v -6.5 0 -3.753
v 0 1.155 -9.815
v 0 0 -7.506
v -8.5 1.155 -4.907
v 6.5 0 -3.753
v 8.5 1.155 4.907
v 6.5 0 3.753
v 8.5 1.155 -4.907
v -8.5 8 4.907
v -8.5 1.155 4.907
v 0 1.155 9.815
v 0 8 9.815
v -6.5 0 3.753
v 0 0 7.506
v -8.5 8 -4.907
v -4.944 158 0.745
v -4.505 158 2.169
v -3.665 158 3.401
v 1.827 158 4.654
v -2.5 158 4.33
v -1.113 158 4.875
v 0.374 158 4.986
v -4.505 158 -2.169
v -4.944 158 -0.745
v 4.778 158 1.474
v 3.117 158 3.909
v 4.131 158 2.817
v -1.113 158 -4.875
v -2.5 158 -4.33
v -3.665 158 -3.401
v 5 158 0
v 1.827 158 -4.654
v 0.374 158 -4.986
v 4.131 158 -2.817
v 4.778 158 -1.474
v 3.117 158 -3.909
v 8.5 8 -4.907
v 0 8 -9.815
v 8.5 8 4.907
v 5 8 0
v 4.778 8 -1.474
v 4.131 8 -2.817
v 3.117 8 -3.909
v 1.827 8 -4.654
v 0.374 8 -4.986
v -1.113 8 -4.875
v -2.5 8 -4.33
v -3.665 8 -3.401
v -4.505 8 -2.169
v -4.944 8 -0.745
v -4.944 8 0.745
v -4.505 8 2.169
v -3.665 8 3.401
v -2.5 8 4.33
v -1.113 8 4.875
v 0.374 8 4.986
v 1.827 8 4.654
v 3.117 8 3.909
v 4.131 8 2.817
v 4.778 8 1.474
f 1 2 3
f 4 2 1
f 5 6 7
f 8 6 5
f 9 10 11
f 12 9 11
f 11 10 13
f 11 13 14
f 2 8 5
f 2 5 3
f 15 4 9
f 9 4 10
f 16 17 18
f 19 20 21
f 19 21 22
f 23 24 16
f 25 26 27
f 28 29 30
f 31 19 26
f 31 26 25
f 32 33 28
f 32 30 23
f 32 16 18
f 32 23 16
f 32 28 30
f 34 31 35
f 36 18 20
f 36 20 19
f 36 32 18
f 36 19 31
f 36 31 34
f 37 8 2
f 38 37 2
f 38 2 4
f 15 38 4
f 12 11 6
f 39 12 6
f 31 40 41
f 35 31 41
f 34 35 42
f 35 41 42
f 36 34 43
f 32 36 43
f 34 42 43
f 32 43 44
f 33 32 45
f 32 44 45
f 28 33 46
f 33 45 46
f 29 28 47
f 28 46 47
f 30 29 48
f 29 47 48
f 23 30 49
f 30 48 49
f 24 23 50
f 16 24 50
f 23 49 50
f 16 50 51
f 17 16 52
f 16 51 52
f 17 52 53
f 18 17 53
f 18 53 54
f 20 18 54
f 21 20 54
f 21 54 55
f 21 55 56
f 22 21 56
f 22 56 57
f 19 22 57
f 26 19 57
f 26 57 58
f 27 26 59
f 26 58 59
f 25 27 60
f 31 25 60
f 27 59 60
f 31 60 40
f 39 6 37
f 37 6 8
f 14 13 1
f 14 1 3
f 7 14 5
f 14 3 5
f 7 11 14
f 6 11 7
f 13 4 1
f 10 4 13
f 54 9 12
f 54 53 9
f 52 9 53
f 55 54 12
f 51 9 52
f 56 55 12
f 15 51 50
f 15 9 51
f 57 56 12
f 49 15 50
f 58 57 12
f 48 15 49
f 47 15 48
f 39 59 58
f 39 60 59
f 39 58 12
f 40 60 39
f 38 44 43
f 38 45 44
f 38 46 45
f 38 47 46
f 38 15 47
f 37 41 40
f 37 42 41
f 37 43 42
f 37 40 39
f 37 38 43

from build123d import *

# Parameters (mm, degrees)
EXTRUDE_1_DEPTH = 8
SKETCH_2_R      = 5
EXTRUDE_2_DEPTH = 150
CHAMFER_1_SIZE  = 2
CHAMFER_1_SIZE2 = 1.154700538


with BuildPart() as part:
    # Эскиз1 → Бобышка-Вытянуть1 (new body)
    with BuildSketch(Plane(origin=(0, 0, 0), x_dir=(1, 0, 0), z_dir=(0, 1, 0))):
        Polygon((8.5, -4.907477288), (8.5, 4.907477288), (0, 9.814954576), (-8.5, 4.907477288), (-8.5, -4.907477288), (0, -9.814954576), align=None)
    extrude(amount=EXTRUDE_1_DEPTH)

    # Эскиз2 → Бобышка-Вытянуть2 (add)
    with BuildSketch(Plane(origin=(0, 8, 0), x_dir=(1, 0, 0), z_dir=(0, 1, 0))):
        Circle(SKETCH_2_R)
    extrude(amount=EXTRUDE_2_DEPTH)

    # Фаска1
    chamfer_1_edges = [part.edges().sort_by_distance(p)[0] for p in [
        (-4.25, 0, 7.361215932),
        (-8.5, 0, 0),
        (-4.25, 0, -7.361215932),
        (4.25, 0, -7.361215932),
        (8.5, 0, 0),
        (4.25, 0, 7.361215932),
    ]]
    chamfer_1_side = [part.faces().sort_by_distance(p)[0] for p in [
        (0, 0, 0),
    ]]
    chamfer(chamfer_1_edges, length=CHAMFER_1_SIZE, length2=CHAMFER_1_SIZE2, reference=chamfer_1_side[0])


solid = part.part
